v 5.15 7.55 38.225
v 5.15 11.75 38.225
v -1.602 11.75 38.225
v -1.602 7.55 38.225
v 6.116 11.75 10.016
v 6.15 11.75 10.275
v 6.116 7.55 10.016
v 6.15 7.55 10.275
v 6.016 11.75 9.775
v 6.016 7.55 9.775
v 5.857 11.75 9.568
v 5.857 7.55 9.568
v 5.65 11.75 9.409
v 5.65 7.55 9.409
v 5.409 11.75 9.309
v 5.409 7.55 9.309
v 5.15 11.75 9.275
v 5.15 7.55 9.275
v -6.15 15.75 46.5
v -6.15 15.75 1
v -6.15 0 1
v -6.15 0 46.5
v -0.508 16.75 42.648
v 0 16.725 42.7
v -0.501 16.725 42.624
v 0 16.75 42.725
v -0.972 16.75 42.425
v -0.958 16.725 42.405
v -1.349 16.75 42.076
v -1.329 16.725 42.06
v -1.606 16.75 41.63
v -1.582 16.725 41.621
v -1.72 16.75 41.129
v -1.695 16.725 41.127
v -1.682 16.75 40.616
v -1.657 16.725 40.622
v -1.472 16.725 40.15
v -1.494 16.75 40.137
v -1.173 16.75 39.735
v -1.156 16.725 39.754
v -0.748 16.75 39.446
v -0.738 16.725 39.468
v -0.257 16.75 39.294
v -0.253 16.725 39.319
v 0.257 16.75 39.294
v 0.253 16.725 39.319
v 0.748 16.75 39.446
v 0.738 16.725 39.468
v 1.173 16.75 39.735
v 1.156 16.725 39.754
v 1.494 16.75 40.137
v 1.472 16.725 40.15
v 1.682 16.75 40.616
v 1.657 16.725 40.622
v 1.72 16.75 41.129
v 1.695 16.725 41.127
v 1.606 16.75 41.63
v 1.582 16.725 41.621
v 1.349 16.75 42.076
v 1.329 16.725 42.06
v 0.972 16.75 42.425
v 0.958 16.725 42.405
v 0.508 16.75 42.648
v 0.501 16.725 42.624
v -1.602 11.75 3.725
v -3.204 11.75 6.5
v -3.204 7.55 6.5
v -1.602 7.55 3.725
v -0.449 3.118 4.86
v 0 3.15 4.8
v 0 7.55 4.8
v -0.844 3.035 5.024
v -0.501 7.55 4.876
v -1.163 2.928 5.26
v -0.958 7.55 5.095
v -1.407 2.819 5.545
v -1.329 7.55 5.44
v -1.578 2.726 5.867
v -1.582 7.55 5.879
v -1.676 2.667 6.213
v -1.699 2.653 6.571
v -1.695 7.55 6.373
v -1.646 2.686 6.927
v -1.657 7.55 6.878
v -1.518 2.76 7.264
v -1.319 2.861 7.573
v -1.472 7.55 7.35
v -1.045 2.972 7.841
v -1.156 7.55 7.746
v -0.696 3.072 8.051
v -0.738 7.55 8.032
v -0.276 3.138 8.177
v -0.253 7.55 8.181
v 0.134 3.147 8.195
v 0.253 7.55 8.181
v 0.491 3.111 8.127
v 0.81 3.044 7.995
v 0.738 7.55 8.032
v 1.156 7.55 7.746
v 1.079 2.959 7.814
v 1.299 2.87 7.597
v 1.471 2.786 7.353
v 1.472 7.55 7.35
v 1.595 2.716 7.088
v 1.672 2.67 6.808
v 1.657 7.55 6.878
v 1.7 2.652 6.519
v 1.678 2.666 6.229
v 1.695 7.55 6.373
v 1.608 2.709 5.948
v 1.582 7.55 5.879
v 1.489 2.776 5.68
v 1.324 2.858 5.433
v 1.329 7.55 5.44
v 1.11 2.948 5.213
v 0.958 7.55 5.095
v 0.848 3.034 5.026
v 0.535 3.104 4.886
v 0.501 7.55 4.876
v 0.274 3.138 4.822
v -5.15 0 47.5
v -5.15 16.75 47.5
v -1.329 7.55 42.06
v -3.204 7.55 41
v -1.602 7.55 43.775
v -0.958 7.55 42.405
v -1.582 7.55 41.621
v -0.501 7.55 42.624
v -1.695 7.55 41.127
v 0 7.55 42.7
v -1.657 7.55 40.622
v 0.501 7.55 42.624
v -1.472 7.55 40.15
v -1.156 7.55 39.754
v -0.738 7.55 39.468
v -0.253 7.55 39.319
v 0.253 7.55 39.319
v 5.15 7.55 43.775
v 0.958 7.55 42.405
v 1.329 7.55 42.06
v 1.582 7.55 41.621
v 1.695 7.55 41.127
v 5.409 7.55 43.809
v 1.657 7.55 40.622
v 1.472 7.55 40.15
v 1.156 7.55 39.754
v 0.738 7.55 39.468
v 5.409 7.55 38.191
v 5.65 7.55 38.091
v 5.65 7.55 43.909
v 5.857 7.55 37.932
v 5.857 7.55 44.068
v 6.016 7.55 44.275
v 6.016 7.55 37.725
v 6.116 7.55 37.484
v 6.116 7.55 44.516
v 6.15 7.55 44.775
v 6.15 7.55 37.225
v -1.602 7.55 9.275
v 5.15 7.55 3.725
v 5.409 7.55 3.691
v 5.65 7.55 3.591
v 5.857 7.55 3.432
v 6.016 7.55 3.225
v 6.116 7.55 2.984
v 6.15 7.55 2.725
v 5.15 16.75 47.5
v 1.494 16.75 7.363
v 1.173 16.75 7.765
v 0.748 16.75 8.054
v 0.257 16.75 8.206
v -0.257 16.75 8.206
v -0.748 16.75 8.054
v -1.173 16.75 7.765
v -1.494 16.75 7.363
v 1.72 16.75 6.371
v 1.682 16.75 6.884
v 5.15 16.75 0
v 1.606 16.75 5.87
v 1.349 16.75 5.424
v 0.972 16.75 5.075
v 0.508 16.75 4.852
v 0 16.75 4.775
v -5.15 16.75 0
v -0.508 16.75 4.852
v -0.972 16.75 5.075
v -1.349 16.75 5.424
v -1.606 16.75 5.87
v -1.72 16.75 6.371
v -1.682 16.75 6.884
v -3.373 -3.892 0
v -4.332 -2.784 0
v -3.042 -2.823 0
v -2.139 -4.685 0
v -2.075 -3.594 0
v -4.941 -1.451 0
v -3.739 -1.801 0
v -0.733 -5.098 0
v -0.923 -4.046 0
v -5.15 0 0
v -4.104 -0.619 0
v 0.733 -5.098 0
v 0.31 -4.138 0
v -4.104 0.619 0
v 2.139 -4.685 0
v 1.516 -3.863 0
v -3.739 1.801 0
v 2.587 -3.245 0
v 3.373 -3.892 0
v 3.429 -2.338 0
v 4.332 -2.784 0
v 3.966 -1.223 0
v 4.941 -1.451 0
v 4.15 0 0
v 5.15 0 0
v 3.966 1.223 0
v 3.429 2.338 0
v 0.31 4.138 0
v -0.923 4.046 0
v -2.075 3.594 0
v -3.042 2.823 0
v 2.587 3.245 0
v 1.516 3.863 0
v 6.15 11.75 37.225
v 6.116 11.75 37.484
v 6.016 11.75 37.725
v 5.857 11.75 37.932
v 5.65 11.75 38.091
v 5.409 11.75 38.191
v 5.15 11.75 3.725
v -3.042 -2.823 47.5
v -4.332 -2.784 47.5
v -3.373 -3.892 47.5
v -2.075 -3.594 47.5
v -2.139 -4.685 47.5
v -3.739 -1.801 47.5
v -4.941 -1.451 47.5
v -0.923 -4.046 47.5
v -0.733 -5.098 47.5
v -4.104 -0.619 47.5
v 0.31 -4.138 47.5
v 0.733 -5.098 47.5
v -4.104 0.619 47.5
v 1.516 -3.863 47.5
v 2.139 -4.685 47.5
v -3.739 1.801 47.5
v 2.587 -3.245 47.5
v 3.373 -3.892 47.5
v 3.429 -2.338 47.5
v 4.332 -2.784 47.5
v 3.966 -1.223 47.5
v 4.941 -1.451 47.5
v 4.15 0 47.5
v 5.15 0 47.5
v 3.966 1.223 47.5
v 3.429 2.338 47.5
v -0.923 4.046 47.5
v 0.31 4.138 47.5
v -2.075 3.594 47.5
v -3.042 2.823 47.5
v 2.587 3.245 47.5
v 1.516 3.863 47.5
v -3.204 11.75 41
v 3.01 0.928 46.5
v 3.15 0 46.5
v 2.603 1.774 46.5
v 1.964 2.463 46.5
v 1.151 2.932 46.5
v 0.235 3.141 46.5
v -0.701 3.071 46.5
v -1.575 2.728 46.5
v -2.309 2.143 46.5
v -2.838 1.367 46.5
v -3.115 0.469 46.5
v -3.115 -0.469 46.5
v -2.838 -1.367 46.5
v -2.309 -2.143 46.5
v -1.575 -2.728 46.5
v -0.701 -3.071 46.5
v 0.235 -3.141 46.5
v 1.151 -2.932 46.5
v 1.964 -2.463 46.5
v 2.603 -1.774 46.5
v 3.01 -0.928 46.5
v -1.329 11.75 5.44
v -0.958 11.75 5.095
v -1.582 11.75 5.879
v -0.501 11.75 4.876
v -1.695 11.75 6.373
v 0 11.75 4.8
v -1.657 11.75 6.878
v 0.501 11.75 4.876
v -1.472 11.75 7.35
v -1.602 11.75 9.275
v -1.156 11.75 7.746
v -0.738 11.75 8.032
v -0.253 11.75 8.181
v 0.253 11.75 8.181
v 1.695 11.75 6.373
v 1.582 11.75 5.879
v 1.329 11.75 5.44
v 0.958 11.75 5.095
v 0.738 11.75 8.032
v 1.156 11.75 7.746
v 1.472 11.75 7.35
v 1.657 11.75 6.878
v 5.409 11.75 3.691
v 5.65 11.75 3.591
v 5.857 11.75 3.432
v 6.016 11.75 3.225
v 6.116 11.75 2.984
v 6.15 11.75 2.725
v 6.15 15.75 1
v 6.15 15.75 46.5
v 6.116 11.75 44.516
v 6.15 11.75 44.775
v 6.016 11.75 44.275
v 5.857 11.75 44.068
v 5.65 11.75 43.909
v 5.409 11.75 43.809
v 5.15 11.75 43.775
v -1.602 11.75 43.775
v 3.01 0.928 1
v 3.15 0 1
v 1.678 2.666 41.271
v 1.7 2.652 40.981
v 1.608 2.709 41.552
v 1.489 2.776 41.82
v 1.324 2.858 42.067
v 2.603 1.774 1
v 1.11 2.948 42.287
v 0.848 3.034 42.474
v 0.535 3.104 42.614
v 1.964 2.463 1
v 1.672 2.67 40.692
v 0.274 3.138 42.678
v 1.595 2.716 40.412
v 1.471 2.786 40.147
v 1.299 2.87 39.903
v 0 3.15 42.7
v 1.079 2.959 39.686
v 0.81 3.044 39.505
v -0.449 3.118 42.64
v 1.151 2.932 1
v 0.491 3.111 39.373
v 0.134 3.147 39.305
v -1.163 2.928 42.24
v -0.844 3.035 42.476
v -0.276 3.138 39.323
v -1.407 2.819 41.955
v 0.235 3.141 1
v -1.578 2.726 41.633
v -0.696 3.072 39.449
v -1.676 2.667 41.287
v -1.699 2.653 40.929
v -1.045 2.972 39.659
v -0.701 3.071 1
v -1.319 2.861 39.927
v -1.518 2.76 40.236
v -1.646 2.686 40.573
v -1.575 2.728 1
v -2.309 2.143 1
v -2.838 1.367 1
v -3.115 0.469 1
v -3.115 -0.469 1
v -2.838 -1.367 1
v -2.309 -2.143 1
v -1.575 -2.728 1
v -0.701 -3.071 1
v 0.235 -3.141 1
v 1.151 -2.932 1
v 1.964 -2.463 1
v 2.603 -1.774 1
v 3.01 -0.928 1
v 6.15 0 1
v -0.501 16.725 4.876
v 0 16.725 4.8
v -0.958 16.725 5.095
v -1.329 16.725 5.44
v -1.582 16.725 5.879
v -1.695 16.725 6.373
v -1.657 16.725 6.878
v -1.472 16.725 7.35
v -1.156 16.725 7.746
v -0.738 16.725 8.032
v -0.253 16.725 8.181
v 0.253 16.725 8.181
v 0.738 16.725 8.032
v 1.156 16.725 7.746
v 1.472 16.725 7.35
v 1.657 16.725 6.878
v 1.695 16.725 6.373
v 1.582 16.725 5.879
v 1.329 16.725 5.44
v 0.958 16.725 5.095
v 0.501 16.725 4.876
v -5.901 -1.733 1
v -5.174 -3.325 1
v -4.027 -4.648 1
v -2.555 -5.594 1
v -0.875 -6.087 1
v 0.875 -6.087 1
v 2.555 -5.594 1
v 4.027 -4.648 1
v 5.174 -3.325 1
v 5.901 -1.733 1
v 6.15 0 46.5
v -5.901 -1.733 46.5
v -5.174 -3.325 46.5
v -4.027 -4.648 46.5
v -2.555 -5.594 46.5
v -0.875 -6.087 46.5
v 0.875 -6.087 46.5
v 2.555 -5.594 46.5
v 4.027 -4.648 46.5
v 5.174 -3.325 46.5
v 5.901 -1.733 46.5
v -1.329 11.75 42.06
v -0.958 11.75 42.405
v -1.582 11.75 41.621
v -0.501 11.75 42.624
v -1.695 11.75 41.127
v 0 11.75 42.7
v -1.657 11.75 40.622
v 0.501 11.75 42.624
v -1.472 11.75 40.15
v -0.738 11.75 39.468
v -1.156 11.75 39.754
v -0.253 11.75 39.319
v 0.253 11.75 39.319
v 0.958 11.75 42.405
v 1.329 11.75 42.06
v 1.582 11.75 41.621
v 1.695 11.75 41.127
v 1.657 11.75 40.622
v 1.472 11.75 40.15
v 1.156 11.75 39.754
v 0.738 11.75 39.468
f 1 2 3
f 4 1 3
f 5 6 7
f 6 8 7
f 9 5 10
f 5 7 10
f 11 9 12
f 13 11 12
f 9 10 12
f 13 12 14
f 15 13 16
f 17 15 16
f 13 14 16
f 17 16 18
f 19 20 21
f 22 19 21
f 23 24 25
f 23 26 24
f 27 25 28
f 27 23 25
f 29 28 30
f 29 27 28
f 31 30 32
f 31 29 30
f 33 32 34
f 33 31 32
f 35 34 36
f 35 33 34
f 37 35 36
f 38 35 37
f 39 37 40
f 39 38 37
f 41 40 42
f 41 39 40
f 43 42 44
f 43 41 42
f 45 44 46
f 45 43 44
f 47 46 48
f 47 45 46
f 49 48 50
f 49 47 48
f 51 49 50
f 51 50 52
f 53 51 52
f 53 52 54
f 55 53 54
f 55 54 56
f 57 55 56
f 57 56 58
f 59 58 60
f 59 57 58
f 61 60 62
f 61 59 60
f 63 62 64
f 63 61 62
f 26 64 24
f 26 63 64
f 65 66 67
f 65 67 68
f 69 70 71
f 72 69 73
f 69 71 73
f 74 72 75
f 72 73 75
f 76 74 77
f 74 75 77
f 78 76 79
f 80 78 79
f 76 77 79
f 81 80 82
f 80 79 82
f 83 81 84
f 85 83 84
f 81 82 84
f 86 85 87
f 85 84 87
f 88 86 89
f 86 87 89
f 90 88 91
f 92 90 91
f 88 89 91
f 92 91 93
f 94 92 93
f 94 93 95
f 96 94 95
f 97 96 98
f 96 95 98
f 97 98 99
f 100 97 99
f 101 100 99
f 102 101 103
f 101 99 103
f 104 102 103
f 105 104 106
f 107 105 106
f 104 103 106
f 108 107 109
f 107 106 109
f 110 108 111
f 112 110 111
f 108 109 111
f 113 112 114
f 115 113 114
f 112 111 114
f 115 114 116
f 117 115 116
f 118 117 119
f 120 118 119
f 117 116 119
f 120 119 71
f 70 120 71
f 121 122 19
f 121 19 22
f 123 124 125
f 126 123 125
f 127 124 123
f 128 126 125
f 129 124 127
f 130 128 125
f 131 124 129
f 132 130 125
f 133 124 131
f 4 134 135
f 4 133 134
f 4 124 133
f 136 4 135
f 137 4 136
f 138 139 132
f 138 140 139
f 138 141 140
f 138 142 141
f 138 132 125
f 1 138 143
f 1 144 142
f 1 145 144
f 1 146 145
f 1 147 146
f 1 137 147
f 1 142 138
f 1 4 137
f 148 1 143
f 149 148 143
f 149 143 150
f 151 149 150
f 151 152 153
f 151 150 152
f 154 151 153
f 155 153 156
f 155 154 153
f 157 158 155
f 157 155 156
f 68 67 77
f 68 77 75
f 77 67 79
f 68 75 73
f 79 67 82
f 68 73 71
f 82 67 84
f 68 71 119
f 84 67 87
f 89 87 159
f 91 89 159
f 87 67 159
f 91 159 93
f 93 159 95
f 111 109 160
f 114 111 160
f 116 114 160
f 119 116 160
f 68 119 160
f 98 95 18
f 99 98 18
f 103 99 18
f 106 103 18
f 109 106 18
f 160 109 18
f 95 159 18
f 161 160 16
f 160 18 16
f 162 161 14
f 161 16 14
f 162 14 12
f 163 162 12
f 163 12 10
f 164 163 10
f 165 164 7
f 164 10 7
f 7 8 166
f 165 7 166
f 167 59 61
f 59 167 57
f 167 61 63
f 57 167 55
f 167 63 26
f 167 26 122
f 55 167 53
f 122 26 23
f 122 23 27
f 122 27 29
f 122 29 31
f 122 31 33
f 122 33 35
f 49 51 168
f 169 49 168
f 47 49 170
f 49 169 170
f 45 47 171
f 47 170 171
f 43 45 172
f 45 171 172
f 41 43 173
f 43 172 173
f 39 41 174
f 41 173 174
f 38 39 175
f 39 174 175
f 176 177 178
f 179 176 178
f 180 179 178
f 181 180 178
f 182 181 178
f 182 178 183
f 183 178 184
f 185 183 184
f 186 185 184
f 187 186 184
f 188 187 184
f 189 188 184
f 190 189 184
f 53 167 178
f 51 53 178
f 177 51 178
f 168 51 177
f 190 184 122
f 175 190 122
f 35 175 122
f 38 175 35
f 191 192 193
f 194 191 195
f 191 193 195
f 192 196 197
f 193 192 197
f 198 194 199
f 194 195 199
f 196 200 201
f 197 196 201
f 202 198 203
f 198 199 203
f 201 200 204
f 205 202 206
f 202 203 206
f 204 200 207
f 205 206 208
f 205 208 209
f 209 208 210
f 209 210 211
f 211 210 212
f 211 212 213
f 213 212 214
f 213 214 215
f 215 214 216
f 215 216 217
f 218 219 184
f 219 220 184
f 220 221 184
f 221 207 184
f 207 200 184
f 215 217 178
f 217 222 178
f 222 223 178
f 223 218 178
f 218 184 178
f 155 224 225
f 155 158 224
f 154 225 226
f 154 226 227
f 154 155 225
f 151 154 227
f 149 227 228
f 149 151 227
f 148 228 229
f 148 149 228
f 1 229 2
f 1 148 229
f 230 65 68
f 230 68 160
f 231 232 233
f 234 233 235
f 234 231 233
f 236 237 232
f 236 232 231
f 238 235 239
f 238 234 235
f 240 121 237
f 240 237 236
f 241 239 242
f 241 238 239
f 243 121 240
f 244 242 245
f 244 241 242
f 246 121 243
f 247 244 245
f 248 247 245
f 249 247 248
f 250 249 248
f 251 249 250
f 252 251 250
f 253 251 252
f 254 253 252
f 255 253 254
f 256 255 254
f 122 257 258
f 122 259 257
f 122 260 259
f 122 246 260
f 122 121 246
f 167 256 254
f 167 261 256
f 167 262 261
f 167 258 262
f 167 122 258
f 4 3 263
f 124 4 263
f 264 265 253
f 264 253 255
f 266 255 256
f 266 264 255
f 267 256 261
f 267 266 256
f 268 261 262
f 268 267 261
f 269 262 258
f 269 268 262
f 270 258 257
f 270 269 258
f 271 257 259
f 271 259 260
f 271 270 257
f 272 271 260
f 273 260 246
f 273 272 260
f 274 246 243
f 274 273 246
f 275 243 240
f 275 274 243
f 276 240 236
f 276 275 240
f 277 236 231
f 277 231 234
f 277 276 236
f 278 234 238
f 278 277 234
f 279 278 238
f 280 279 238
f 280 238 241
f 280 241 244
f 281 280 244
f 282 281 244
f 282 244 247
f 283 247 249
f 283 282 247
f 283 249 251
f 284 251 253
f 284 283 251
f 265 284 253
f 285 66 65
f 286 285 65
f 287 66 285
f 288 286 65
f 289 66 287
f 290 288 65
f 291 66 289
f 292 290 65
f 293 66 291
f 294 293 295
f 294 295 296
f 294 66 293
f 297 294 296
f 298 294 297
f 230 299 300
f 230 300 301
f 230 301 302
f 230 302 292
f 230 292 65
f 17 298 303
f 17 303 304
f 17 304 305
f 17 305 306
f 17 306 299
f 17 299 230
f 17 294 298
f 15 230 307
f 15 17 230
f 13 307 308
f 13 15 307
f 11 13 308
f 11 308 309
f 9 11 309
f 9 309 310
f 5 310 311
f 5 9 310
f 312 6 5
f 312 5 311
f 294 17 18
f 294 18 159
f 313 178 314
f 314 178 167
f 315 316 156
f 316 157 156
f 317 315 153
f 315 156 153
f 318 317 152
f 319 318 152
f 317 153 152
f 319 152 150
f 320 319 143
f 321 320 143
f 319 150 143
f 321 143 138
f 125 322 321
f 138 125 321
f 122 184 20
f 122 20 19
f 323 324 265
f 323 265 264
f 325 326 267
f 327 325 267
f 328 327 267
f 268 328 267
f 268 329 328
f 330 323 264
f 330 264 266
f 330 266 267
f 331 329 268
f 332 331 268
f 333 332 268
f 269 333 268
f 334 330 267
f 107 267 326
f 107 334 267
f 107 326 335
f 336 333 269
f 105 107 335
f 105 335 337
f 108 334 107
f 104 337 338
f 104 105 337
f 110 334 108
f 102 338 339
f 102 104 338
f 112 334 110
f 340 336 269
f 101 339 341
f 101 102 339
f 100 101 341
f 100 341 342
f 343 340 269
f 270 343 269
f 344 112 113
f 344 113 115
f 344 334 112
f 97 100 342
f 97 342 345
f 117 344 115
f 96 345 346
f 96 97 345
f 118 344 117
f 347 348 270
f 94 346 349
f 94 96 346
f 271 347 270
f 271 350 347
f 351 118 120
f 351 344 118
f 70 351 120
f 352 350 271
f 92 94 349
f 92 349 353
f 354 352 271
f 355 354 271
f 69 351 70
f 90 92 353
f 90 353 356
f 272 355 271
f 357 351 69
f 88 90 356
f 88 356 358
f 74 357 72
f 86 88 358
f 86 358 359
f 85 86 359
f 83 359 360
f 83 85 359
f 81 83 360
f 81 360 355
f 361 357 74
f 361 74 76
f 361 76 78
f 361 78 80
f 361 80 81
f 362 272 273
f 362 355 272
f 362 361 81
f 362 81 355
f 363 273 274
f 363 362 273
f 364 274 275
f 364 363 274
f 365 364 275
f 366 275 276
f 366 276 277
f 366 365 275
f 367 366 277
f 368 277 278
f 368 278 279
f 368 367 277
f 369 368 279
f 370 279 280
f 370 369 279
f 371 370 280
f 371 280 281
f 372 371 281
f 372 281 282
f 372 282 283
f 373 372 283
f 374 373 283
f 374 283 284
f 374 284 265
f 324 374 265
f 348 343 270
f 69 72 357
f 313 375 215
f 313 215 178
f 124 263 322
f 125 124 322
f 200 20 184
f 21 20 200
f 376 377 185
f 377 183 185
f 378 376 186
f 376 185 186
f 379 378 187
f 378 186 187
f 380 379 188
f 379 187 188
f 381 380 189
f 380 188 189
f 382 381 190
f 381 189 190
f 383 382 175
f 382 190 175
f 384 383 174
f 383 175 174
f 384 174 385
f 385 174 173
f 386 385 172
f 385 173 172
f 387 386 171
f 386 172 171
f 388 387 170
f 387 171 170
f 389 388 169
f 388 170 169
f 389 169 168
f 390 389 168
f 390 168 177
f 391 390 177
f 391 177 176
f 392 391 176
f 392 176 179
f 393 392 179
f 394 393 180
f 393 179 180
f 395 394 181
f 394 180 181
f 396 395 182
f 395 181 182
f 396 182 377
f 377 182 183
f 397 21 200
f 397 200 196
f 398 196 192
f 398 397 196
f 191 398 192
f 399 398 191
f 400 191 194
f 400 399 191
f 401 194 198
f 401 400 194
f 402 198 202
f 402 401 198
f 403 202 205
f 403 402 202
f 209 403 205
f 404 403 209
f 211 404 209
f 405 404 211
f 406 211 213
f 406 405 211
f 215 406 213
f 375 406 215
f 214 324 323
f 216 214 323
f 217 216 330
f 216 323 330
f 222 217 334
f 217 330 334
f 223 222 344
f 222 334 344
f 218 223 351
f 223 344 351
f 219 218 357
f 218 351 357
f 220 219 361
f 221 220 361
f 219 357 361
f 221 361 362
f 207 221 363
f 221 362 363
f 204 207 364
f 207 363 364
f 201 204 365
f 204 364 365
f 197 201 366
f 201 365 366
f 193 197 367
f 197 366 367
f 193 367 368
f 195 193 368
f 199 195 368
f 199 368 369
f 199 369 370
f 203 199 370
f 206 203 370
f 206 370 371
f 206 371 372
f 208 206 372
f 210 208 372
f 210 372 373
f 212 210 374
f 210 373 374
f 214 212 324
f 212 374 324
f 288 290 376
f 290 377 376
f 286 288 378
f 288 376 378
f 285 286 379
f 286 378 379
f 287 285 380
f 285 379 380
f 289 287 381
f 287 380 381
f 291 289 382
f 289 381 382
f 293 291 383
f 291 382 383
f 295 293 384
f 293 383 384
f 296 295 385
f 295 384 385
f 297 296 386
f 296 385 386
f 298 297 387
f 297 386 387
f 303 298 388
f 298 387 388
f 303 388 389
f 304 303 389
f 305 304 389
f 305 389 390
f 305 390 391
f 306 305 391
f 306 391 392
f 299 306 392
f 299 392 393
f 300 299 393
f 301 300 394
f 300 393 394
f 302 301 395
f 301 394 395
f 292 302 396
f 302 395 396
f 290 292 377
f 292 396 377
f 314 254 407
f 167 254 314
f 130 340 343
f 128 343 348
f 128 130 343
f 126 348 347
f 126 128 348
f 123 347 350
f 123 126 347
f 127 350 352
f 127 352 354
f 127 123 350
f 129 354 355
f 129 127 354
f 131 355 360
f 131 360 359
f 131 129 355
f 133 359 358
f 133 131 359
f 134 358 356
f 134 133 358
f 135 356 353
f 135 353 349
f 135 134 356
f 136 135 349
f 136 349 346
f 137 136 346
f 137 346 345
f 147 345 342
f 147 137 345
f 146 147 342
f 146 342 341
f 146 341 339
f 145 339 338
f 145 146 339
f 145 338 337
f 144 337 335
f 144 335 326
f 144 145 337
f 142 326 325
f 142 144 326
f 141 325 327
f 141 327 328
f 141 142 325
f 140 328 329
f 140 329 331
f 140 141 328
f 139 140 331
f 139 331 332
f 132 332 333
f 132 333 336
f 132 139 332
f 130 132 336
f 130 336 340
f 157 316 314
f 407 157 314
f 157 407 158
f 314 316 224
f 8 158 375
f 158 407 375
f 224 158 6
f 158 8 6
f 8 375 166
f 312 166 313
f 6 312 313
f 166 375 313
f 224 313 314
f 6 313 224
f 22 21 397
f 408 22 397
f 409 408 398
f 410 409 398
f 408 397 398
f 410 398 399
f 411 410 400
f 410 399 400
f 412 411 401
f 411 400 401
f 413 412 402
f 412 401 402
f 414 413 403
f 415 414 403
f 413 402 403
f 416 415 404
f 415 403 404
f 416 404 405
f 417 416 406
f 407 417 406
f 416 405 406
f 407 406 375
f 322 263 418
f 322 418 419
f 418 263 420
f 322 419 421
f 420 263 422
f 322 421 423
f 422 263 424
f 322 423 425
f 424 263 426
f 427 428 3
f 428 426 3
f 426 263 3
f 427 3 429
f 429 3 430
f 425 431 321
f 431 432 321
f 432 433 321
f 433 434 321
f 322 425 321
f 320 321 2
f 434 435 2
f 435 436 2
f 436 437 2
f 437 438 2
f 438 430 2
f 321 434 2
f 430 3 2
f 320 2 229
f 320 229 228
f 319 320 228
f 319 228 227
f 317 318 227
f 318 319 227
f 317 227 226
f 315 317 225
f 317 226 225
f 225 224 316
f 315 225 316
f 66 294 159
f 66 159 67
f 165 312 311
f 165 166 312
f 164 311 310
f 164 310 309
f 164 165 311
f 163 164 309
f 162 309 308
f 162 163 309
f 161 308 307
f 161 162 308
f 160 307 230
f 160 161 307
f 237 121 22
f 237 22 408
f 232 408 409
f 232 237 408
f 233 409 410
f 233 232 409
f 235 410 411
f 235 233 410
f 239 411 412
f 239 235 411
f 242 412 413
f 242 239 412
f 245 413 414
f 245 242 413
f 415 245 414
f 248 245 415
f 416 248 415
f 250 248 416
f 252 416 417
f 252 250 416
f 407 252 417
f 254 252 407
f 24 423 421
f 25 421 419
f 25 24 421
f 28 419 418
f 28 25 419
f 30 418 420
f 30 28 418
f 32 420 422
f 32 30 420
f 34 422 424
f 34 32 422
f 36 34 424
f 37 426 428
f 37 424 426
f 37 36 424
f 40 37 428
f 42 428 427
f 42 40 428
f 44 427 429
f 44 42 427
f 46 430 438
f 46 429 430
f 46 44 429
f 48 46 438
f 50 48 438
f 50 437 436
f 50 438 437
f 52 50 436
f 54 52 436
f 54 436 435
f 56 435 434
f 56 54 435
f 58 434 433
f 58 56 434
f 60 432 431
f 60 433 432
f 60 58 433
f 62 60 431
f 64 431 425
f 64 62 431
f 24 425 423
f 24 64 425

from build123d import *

# Parameters (mm, degrees)
SKETCH1_R           = 3.15
BOSS_EXTRUDE1_DEPTH = 47.5
CUT_EXTRUDE1_DEPTH  = 4.2
FILLET1_R           = 1
CHAMFER1_SIZE       = 1
CHAMFER2_SIZE       = 1


with BuildPart() as part:
    # Sketch1 → Boss-Extrude1 (new body)
    with BuildSketch(Plane.XY):
        with BuildLine():
            Line((6.15, 0), (6.15, 16.75))
            Line((6.15, 16.75), (-6.15, 16.75))
            Line((-6.15, 16.75), (-6.15, 0))
            ThreePointArc((-6.15, 0), (0, -6.15), (6.15, 0))
        make_face()
        Circle(SKETCH1_R, mode=Mode.SUBTRACT)
    extrude(amount=BOSS_EXTRUDE1_DEPTH)

    # Sketch4 → Cut-Extrude1 (cut)
    with BuildSketch(Plane(origin=(0, 11.75, 0), x_dir=(1, 0, 0), z_dir=(0, 1, 0))):
        Polygon((-3.204293994, -41), (-1.602146997, -43.775), (1.602146997, -43.775), (6.15, -43.775), (6.15, -38.225), (1.602146997, -38.225), (-1.602146997, -38.225), align=None)
    cut_extrude1 = extrude(amount=-CUT_EXTRUDE1_DEPTH, mode=Mode.SUBTRACT)

    # Sketch7 → M3 Clearance Hole1 (revolve, cut)
    with BuildSketch(Plane(origin=(0, 16.75, 41), x_dir=(0, 0, 1), z_dir=(1, 0, 0))):
        Polygon((0, 0), (0, 17.770463052), (1.7, 16.749), (1.7, 0.025), (1.725, 0), align=None)
    m3_clearance_hole1 = revolve(axis=Axis((0, 23.1, 41), (0, -1, 0)), mode=Mode.SUBTRACT)

    # Mirror1: Cut-Extrude1, M3 Clearance Hole1 across plane
    add(cut_extrude1.mirror(Plane(origin=(0, 0, 23.75), x_dir=(1, 0, 0), z_dir=(0, 0, -1))), mode=Mode.SUBTRACT)
    add(m3_clearance_hole1.mirror(Plane(origin=(0, 0, 23.75), x_dir=(1, 0, 0), z_dir=(0, 0, -1))), mode=Mode.SUBTRACT)

    # Fillet1
    fillet1_edges = [part.edges().sort_by_distance(p)[0] for p in [
        (6.15, 9.65, 38.225),
        (6.15, 9.65, 43.775),
        (6.15, 9.65, 3.725),
        (6.15, 9.65, 9.275),
    ]]
    fillet(fillet1_edges, radius=FILLET1_R)

    # Chamfer1
    chamfer1_edges = [part.edges().sort_by_distance(p)[0] for p in [
        (-6.15, 8.375, 47.5),
        (0, -6.15, 47.5),
        (-6.15, 8.375, 0),
        (6.15, 8.375, 0),
        (0, -6.15, 0),
        (-6.15, 16.75, 23.75),
        (6.15, 16.75, 23.75),
        (6.15, 8.375, 47.5),
    ]]
    chamfer(chamfer1_edges, length=CHAMFER1_SIZE)

    # Chamfer2
    chamfer2_edges = [part.edges().sort_by_distance(p)[0] for p in [
        (-3.15, 0, 0),
        (-3.15, 0, 47.5),
    ]]
    chamfer(chamfer2_edges, length=CHAMFER2_SIZE)


solid = part.part
